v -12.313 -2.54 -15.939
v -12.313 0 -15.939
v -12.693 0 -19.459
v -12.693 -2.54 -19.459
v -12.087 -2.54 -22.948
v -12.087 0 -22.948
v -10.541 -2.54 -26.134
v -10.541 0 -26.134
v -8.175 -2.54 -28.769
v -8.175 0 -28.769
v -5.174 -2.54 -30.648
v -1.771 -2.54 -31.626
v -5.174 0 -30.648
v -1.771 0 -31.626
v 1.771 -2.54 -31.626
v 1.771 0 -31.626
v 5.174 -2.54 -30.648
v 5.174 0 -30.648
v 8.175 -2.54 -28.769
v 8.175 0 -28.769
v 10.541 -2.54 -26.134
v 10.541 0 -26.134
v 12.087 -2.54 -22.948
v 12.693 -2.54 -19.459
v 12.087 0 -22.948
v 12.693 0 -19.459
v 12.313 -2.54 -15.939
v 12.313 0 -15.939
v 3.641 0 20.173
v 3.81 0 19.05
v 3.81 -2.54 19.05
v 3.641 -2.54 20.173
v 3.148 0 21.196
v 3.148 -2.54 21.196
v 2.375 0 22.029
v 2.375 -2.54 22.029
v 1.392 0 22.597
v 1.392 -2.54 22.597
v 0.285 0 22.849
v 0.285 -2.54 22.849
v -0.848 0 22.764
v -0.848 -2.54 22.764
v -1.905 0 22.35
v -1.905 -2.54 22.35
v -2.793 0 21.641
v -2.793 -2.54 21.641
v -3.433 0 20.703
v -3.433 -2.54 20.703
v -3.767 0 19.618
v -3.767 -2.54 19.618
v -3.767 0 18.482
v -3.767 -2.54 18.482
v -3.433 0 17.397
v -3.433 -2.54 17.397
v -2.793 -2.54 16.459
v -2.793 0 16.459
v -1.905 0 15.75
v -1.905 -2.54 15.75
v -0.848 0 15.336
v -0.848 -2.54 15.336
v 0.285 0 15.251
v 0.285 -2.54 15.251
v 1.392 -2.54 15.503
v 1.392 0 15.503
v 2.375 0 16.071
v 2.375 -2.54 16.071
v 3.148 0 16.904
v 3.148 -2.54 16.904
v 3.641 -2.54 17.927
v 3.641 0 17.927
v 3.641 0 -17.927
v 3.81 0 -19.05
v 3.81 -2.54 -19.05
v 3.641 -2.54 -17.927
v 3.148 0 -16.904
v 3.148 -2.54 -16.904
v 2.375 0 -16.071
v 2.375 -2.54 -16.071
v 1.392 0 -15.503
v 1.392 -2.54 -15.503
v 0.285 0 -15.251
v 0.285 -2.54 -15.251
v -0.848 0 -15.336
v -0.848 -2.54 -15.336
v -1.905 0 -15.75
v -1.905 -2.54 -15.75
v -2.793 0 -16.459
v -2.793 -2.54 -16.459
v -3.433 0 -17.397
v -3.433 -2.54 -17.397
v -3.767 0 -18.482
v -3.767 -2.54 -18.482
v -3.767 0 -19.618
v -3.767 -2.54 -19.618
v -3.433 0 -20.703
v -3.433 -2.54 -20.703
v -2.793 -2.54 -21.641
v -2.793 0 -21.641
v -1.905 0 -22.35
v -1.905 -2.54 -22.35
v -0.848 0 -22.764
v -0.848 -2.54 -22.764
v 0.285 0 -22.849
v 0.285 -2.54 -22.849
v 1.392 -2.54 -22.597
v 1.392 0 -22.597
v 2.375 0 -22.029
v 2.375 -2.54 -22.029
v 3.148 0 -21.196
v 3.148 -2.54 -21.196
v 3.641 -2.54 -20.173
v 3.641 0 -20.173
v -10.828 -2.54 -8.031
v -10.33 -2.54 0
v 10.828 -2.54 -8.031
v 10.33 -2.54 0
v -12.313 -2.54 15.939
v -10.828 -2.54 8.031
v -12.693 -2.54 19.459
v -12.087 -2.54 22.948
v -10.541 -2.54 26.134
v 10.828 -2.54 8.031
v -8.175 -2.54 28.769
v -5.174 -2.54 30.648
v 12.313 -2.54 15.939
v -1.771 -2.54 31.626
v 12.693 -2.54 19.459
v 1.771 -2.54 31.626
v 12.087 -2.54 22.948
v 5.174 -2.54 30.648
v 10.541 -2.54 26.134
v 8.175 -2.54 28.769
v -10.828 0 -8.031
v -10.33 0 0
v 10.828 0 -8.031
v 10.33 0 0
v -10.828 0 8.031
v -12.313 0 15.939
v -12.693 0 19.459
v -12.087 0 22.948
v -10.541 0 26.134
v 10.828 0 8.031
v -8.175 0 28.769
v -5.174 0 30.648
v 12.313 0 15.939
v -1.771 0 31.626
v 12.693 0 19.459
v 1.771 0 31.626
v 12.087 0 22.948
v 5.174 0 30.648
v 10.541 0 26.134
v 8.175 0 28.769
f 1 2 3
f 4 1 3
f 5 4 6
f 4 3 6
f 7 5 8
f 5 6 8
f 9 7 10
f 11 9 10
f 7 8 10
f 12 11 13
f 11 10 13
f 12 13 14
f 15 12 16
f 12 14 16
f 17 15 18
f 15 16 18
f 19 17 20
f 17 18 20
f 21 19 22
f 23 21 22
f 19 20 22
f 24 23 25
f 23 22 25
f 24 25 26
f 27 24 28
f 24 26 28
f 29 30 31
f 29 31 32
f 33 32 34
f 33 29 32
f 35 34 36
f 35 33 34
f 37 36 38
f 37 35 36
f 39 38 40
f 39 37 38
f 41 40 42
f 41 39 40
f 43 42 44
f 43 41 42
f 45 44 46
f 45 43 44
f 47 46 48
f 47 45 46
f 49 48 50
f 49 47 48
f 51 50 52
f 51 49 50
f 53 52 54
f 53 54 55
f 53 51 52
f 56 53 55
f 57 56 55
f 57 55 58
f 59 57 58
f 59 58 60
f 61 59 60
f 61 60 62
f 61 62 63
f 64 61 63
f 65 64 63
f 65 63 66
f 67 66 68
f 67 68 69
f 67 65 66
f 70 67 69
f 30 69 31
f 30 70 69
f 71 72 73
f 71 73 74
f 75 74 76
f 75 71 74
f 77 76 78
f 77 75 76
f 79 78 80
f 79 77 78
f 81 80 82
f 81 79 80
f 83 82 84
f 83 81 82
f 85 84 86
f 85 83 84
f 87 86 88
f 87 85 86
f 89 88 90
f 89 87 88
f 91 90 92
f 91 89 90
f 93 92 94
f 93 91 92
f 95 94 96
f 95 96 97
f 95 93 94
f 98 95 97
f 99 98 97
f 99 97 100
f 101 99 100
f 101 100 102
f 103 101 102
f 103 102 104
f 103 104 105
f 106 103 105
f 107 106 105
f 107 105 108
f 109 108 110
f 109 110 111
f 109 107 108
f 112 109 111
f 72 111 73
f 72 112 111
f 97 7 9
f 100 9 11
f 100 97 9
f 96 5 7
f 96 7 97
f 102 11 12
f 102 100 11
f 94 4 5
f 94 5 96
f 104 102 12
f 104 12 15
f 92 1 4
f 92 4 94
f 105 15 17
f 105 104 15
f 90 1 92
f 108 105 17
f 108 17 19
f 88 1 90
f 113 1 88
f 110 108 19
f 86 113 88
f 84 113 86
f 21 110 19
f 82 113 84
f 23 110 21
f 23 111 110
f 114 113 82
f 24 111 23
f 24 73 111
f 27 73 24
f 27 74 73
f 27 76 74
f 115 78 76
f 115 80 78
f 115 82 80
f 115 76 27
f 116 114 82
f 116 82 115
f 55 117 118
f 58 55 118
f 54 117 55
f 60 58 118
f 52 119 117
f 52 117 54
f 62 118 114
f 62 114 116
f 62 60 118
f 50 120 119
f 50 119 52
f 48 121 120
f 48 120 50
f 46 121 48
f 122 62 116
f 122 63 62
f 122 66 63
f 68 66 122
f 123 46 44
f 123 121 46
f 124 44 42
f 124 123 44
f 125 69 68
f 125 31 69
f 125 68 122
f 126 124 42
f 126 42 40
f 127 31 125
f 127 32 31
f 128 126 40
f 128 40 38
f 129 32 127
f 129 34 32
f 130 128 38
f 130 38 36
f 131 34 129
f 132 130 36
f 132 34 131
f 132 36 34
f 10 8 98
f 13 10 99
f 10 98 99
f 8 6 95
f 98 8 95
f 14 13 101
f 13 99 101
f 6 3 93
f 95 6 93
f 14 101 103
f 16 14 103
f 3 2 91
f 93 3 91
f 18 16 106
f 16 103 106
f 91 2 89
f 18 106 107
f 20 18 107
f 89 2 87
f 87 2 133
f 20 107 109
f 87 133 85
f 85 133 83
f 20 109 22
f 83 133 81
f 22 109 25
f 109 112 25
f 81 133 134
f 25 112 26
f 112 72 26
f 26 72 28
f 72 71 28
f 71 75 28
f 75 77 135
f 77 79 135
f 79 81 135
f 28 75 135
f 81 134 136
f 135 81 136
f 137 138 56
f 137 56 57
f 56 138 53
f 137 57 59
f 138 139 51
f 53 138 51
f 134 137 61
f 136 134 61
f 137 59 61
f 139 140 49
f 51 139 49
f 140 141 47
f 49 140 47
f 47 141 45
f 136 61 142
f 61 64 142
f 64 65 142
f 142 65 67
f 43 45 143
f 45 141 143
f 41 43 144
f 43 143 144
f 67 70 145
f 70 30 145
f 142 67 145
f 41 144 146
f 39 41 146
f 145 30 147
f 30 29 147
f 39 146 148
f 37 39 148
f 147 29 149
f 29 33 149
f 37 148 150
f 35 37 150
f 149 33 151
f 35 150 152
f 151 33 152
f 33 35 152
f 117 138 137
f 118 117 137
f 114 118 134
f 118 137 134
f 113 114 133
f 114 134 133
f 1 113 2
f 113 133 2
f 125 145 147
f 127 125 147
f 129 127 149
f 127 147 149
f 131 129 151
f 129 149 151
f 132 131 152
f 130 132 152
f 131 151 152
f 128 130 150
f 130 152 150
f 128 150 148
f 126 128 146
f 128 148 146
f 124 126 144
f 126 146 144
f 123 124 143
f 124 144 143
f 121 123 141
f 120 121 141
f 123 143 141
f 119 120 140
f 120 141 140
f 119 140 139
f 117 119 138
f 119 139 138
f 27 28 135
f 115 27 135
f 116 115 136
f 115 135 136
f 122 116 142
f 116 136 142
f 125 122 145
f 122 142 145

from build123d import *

# Parameters (mm, degrees)
F0_R     = 3.81
F1_DEPTH = 2.54


with BuildPart() as f1:
    # F0 (on Front) → F1 (new body)
    with BuildSketch(Plane.XZ):
        with BuildLine():
            ThreePointArc((12.312997, -15.938714), (10.330432, 0), (12.312997, 15.938714))
            ThreePointArc((12.312997, 15.938714), (0, 31.75), (-12.312997, 15.938714))
            ThreePointArc((-12.312997, 15.938714), (-10.330432, 0), (-12.312997, -15.938714))
            ThreePointArc((-12.312997, -15.938714), (0, -31.75), (12.312997, -15.938714))
        make_face()
        with Locations((0, -19.05)):
            Circle(F0_R, mode=Mode.SUBTRACT)
        with Locations((0, 19.05)):
            Circle(F0_R, mode=Mode.SUBTRACT)
    extrude(amount=F1_DEPTH)


solid = f1.part
